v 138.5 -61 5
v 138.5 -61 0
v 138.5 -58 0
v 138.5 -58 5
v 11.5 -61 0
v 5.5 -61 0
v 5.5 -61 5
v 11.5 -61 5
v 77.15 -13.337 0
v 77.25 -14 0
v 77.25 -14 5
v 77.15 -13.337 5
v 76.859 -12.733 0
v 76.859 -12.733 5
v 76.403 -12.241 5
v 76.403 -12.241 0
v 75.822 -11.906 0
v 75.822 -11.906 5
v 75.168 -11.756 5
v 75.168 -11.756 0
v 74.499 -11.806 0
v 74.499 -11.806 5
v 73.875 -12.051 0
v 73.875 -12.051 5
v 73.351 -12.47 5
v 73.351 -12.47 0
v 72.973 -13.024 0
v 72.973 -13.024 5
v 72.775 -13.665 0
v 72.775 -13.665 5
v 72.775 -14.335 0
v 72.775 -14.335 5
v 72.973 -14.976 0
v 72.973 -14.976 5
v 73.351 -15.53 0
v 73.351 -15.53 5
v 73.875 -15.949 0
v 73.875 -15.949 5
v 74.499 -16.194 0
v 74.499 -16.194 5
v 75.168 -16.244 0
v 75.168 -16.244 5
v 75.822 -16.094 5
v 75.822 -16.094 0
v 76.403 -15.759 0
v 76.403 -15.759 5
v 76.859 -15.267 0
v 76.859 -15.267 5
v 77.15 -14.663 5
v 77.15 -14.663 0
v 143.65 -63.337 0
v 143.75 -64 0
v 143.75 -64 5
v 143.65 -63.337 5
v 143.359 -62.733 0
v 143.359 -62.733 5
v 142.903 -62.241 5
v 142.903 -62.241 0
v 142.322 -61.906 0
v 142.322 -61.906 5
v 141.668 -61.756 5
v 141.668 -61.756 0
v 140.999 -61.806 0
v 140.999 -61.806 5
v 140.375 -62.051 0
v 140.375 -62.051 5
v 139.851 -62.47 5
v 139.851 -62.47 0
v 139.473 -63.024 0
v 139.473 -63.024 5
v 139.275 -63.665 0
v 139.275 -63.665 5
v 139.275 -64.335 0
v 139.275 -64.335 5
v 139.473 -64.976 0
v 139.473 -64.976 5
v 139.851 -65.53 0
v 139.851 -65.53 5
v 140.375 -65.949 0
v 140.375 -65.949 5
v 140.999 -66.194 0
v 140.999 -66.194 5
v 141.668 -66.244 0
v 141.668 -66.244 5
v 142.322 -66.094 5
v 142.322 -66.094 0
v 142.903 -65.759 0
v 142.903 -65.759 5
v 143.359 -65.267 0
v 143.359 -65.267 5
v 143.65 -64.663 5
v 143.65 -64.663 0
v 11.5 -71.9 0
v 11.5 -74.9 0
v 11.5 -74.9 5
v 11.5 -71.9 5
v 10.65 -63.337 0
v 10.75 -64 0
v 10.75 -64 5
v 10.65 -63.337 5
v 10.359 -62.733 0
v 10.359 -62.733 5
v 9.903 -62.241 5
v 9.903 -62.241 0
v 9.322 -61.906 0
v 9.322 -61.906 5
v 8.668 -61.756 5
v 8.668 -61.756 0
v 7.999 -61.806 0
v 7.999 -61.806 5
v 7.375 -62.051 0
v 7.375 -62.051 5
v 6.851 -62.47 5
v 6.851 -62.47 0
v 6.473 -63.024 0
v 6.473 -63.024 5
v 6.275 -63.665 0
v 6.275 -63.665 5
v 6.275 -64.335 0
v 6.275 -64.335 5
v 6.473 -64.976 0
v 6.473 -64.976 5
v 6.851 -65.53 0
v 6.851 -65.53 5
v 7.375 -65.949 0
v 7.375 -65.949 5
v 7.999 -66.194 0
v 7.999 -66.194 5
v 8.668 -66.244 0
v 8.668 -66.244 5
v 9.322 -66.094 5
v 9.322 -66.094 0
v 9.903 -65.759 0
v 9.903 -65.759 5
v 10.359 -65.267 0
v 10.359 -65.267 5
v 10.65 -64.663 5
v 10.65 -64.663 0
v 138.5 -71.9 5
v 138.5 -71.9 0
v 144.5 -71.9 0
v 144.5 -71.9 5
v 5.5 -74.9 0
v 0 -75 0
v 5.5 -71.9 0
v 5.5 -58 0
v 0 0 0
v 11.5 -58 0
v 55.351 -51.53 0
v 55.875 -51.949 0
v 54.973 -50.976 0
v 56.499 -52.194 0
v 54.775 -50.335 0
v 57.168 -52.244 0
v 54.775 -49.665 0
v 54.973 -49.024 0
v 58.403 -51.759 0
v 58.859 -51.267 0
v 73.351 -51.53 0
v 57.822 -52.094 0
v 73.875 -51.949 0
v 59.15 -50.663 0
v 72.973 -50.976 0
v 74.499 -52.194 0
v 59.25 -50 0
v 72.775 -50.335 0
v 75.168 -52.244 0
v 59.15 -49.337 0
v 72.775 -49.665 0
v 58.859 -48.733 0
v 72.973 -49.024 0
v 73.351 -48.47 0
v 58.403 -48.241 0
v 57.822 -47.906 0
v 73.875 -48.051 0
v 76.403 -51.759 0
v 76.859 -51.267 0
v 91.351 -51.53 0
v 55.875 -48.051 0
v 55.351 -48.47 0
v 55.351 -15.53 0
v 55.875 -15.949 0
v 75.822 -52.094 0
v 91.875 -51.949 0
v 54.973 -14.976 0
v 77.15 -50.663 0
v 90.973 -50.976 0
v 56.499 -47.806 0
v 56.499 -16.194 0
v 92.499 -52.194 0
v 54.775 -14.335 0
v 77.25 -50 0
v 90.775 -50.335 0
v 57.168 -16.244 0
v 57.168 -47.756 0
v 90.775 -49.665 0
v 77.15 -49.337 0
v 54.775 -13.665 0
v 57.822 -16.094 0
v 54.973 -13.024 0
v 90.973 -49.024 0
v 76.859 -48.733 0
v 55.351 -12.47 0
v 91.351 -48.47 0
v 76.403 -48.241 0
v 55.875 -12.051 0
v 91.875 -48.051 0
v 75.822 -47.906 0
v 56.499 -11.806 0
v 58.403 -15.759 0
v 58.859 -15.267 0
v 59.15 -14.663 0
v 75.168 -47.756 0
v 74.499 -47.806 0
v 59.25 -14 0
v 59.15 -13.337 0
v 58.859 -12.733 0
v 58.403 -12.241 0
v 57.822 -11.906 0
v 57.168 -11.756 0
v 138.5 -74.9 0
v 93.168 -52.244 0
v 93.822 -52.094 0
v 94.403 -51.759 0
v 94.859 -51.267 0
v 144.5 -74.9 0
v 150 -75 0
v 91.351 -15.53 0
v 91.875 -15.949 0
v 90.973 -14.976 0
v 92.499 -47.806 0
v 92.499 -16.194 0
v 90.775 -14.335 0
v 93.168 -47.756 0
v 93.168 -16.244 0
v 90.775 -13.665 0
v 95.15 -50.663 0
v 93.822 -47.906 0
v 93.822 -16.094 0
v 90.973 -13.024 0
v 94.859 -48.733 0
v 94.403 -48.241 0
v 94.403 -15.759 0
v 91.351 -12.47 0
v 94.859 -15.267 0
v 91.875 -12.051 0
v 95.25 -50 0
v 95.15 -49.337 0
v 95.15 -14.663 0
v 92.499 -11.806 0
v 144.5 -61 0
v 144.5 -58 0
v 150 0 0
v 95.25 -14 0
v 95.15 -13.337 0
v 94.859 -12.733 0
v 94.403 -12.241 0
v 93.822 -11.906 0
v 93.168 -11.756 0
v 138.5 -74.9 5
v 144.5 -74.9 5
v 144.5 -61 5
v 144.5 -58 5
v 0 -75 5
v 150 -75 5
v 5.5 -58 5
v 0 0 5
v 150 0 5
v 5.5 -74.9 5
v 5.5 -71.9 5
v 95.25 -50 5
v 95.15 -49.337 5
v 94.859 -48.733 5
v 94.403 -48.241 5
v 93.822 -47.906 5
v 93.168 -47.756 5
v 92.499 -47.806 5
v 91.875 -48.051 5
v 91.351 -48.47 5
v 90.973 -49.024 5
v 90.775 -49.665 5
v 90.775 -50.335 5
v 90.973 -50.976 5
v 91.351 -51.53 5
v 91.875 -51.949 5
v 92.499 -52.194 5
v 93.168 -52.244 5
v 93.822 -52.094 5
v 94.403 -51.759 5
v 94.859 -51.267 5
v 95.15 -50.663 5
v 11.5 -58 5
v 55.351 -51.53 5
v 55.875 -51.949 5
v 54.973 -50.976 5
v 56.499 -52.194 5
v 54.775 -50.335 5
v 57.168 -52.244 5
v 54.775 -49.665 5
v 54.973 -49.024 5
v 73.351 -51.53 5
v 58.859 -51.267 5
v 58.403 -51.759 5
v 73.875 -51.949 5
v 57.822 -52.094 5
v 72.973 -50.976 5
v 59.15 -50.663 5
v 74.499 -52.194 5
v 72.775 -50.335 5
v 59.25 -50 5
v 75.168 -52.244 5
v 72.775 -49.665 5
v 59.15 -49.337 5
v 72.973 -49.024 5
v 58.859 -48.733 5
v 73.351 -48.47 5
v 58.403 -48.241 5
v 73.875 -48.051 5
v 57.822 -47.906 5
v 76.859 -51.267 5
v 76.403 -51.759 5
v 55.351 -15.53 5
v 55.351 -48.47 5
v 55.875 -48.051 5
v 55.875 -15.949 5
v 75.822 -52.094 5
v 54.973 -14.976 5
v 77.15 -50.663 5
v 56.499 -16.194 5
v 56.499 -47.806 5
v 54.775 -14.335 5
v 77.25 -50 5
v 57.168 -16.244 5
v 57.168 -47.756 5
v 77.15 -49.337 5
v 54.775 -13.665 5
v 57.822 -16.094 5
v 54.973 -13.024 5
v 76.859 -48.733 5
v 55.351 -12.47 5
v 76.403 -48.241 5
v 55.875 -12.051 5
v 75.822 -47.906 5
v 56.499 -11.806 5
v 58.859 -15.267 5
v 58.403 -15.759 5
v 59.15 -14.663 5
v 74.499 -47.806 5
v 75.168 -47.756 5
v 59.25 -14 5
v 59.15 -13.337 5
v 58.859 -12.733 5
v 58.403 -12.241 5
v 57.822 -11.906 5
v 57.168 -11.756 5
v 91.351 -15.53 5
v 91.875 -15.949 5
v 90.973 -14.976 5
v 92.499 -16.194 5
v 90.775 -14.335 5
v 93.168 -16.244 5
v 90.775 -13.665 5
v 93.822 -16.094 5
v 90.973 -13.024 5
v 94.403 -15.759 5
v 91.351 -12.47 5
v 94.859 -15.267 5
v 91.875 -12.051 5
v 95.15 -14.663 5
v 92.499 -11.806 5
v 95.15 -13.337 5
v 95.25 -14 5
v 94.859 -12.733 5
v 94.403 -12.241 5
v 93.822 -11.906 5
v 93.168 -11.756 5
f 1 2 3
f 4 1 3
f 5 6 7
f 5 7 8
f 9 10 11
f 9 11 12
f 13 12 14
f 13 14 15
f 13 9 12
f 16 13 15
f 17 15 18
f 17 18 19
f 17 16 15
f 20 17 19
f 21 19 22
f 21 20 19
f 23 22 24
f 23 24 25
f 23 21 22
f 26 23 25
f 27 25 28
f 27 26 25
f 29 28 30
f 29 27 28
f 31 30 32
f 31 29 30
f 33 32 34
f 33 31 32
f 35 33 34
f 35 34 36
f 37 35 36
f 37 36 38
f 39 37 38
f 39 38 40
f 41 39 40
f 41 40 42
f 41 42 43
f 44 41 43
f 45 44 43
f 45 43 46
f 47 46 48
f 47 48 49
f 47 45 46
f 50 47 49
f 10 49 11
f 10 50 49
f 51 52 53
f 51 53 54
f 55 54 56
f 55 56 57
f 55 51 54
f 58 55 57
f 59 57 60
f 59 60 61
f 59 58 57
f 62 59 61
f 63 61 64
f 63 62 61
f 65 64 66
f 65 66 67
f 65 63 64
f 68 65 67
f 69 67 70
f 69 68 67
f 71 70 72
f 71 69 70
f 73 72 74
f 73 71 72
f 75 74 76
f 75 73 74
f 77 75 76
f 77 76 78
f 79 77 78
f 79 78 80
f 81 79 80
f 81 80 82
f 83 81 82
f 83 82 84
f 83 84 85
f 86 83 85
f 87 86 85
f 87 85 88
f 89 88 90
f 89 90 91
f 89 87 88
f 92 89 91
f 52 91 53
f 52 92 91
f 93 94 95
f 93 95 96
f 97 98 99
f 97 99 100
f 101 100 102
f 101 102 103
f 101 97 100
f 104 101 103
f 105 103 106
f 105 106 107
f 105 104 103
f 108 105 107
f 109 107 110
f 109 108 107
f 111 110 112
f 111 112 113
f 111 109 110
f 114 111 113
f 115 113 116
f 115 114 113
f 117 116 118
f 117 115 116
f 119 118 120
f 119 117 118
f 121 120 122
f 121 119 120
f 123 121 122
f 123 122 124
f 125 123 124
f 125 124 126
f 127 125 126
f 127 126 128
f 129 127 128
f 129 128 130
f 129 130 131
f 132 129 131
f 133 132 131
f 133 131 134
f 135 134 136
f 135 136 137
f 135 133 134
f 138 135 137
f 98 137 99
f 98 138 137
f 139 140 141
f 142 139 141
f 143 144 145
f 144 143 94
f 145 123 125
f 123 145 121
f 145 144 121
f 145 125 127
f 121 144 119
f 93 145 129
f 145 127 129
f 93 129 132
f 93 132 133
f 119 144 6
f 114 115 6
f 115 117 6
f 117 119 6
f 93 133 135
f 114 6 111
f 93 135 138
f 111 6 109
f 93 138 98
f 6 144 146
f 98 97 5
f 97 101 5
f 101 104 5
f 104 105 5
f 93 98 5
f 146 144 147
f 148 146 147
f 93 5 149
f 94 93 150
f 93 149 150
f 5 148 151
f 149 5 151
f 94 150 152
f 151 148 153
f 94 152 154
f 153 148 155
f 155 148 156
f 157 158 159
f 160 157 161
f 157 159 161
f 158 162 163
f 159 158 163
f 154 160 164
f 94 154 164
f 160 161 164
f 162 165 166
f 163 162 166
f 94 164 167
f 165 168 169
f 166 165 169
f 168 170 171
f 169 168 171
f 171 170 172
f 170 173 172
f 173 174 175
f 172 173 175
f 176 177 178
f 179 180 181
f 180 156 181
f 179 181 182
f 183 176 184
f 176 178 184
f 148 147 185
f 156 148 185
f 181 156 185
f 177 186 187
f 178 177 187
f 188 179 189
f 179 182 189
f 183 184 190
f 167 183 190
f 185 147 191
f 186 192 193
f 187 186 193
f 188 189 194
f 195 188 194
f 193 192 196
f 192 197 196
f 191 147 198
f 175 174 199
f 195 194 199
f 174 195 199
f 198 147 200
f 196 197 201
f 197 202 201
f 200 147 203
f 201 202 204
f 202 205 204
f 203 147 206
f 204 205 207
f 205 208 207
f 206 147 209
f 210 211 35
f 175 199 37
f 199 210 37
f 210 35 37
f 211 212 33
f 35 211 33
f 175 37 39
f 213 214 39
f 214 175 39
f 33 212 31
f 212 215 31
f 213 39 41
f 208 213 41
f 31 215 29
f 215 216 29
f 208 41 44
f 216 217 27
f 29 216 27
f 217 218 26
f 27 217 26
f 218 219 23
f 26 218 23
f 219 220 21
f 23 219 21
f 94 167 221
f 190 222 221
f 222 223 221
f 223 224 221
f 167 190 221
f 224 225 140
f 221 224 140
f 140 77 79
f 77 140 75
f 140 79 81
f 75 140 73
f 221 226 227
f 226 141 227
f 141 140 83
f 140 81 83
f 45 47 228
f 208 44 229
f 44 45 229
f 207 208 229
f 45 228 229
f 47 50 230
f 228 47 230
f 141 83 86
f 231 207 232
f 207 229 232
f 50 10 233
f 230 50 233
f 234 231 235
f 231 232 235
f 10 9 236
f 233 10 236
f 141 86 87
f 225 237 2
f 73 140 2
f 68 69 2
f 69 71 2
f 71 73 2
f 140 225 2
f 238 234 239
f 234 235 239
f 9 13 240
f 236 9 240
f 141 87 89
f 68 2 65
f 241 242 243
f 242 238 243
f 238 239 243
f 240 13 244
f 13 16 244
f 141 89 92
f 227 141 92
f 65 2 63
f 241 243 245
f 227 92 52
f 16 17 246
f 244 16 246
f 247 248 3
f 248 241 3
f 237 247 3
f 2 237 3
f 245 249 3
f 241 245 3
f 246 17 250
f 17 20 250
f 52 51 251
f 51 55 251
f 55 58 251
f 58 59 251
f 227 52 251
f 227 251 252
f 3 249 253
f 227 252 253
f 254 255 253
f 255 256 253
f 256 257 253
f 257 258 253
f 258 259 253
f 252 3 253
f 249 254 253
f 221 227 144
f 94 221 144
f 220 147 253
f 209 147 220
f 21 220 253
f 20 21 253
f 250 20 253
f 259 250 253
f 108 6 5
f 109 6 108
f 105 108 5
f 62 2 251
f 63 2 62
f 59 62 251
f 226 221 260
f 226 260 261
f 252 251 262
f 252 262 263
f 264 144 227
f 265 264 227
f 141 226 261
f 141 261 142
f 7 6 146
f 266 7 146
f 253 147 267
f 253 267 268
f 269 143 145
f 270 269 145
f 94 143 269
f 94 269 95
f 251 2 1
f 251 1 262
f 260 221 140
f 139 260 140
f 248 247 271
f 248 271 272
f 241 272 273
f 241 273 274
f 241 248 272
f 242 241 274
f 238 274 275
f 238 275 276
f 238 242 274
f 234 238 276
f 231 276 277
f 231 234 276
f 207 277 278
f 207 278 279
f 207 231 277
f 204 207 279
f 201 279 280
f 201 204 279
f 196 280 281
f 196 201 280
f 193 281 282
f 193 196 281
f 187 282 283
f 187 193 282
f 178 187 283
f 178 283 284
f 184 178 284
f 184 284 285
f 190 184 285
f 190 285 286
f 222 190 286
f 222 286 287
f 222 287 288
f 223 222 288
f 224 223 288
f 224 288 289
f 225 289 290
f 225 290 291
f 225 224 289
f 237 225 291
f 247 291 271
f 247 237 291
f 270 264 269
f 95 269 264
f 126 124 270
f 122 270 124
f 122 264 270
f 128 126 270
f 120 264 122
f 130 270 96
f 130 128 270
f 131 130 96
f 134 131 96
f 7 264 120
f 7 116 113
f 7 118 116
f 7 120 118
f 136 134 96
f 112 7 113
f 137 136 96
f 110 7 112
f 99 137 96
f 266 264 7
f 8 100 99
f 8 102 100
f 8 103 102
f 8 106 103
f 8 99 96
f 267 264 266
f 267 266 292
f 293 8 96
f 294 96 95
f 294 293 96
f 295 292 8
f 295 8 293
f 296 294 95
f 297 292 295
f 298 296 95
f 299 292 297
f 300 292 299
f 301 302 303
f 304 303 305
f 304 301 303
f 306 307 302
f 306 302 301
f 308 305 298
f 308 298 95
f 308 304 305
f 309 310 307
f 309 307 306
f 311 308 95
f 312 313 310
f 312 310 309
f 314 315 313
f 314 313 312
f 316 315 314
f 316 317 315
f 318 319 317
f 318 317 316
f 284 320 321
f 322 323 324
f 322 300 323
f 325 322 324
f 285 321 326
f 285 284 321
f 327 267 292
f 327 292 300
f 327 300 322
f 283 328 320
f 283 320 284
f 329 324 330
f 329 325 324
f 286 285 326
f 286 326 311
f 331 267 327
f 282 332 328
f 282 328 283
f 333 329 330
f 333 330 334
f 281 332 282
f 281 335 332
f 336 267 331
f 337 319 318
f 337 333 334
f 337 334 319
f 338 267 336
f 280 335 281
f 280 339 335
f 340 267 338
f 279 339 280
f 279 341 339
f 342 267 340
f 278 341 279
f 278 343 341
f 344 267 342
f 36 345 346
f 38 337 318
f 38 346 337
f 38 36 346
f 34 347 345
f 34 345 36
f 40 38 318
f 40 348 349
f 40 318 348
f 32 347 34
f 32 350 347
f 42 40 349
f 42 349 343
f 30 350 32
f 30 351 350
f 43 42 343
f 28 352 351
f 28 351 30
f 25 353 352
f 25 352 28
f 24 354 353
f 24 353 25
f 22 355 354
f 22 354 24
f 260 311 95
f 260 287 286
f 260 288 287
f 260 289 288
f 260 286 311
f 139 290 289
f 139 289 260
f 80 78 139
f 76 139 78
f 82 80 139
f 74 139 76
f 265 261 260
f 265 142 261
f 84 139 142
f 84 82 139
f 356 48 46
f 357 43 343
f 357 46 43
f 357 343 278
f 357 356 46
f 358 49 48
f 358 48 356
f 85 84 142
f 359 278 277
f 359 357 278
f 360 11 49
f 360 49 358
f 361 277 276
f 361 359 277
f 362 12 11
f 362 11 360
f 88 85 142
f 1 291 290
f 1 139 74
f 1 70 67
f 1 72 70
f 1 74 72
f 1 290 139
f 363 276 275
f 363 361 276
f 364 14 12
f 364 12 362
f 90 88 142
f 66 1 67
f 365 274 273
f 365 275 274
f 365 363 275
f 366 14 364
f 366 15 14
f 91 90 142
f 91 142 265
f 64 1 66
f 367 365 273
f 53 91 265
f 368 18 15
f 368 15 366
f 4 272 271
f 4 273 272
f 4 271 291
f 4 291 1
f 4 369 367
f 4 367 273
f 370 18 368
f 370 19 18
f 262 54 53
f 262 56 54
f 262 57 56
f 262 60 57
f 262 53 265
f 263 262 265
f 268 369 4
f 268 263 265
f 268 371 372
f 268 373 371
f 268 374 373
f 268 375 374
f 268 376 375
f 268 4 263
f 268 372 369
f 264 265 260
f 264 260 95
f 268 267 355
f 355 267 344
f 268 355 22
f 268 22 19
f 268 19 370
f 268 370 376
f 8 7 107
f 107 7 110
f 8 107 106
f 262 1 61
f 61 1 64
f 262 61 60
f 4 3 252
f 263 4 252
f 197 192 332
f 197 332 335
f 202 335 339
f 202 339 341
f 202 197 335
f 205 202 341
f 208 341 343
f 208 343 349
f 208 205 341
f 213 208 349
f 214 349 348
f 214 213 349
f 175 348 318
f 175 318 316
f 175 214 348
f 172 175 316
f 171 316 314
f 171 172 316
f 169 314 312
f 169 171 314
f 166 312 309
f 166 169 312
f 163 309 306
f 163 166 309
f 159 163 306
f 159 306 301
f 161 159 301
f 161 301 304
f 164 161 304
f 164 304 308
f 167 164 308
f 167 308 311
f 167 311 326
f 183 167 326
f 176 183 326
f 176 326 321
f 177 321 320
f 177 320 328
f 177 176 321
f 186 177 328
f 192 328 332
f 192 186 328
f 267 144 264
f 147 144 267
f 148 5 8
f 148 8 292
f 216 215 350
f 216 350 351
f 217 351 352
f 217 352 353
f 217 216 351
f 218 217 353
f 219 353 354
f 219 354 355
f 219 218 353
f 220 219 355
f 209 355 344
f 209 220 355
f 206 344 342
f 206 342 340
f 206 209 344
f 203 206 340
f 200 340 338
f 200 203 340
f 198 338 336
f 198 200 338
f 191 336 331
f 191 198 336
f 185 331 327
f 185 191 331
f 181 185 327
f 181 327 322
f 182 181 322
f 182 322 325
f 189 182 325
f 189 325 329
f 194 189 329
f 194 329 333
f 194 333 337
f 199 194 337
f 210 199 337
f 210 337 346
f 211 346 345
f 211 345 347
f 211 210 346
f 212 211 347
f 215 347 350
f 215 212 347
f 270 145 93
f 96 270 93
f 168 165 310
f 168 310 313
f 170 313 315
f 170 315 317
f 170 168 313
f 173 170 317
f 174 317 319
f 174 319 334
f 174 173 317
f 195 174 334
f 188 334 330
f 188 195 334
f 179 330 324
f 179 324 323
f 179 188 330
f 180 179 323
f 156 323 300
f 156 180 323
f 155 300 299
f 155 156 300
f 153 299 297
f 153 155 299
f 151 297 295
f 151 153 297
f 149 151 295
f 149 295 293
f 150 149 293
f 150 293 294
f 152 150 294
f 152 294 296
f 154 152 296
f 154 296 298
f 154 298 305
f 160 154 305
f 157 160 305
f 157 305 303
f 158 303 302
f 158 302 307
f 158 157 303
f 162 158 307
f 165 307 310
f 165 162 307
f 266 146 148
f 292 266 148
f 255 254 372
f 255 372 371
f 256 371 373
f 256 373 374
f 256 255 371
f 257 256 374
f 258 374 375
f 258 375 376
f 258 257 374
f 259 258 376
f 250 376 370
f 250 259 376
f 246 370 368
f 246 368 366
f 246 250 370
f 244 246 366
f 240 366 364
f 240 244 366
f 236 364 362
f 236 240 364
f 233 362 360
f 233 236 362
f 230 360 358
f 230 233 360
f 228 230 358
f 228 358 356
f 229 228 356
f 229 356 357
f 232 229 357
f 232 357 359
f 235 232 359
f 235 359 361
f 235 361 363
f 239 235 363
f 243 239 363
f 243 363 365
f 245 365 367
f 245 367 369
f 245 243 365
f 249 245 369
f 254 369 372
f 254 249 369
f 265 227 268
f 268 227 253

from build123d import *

# Parameters (mm, degrees)
ESQUISSE1_W        = 150
ESQUISSE1_H        = 75
ESQUISSE1_R        = 2.25
ESQUISSE1_W_2      = 6
ESQUISSE1_H_2      = 3
BOSS_EXTRU_1_DEPTH = 5


with BuildPart() as part:
    # Esquisse1 → Boss.-Extru.1 (new body)
    with BuildSketch(Plane.XY):
        with Locations((75, -37.5)):
            Rectangle(ESQUISSE1_W, ESQUISSE1_H)
        with Locations((8.5, -64)):
            Circle(ESQUISSE1_R, mode=Mode.SUBTRACT)
        with Locations((141.5, -64)):
            Circle(ESQUISSE1_R, mode=Mode.SUBTRACT)
        with Locations((57, -14)):
            Circle(ESQUISSE1_R, mode=Mode.SUBTRACT)
        with Locations((93, -14)):
            Circle(ESQUISSE1_R, mode=Mode.SUBTRACT)
        with Locations((93, -50)):
            Circle(ESQUISSE1_R, mode=Mode.SUBTRACT)
        with Locations((57, -50)):
            Circle(ESQUISSE1_R, mode=Mode.SUBTRACT)
        with Locations((75, -14)):
            Circle(ESQUISSE1_R, mode=Mode.SUBTRACT)
        with Locations((75, -50)):
            Circle(ESQUISSE1_R, mode=Mode.SUBTRACT)
        with Locations((8.5, -59.5)):
            Rectangle(ESQUISSE1_W_2, ESQUISSE1_H_2, mode=Mode.SUBTRACT)
        with Locations((8.5, -73.4)):
            Rectangle(ESQUISSE1_W_2, ESQUISSE1_H_2, mode=Mode.SUBTRACT)
        with Locations((141.5, -59.5)):
            Rectangle(ESQUISSE1_W_2, ESQUISSE1_H_2, mode=Mode.SUBTRACT)
        with Locations((141.5, -73.4)):
            Rectangle(ESQUISSE1_W_2, ESQUISSE1_H_2, mode=Mode.SUBTRACT)
    extrude(amount=BOSS_EXTRU_1_DEPTH)


solid = part.part
